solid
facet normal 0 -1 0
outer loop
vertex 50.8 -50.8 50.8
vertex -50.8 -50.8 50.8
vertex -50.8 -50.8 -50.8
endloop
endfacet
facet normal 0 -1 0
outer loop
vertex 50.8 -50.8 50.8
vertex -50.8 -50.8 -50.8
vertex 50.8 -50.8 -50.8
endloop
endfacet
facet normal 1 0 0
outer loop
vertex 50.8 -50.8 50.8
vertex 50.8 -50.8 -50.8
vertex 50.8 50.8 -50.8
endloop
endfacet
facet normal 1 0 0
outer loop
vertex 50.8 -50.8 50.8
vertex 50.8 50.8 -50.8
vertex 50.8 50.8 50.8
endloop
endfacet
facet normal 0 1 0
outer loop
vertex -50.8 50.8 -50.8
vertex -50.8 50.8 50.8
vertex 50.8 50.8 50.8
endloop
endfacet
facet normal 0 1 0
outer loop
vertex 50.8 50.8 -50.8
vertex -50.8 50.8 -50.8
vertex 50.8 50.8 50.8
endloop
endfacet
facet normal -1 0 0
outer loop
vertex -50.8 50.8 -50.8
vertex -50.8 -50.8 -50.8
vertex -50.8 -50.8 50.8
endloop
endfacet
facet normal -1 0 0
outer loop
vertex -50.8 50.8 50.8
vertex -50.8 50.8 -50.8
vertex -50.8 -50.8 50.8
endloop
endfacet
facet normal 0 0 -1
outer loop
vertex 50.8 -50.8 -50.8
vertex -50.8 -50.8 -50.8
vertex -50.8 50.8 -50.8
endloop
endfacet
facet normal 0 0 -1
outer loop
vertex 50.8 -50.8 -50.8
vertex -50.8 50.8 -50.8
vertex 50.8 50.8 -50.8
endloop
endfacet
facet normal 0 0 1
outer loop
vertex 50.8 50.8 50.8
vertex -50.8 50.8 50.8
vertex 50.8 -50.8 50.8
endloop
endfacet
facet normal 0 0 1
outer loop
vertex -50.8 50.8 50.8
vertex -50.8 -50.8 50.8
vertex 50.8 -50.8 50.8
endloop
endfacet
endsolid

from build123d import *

# Parameters (mm, degrees)
F1_W     = 101.6
F1_H     = 101.6
F2_DEPTH = 50.8
F3_W     = 38.1
F3_H     = 38.1
F4_DEPTH = 25.4
F5_DEPTH = 25.4


# Not quite as in the source:
# - a variable given as a bare number and used for a length is read in inches; the dataset says mm whatever the document's units were


with BuildPart() as f2:
    # F1 (on Front) → F2 (new body, symmetric)
    with BuildSketch(Plane.XZ):
        Rectangle(F1_W, F1_H)
    extrude(amount=F2_DEPTH, both=True)

    # F3 (on face) → F4 (join)
    with BuildSketch(Plane.XZ.offset(50.8)):
        Rectangle(F3_W, F3_H)
    extrude(amount=F4_DEPTH)

    # F5 (cut): a face of the model
    f5_faces = [f2.faces().sort_by_distance(p)[0] for p in [
        (0, -76.2, 0),
    ]]
    extrude(f5_faces, amount=-F5_DEPTH, mode=Mode.SUBTRACT)


solid = f2.part
